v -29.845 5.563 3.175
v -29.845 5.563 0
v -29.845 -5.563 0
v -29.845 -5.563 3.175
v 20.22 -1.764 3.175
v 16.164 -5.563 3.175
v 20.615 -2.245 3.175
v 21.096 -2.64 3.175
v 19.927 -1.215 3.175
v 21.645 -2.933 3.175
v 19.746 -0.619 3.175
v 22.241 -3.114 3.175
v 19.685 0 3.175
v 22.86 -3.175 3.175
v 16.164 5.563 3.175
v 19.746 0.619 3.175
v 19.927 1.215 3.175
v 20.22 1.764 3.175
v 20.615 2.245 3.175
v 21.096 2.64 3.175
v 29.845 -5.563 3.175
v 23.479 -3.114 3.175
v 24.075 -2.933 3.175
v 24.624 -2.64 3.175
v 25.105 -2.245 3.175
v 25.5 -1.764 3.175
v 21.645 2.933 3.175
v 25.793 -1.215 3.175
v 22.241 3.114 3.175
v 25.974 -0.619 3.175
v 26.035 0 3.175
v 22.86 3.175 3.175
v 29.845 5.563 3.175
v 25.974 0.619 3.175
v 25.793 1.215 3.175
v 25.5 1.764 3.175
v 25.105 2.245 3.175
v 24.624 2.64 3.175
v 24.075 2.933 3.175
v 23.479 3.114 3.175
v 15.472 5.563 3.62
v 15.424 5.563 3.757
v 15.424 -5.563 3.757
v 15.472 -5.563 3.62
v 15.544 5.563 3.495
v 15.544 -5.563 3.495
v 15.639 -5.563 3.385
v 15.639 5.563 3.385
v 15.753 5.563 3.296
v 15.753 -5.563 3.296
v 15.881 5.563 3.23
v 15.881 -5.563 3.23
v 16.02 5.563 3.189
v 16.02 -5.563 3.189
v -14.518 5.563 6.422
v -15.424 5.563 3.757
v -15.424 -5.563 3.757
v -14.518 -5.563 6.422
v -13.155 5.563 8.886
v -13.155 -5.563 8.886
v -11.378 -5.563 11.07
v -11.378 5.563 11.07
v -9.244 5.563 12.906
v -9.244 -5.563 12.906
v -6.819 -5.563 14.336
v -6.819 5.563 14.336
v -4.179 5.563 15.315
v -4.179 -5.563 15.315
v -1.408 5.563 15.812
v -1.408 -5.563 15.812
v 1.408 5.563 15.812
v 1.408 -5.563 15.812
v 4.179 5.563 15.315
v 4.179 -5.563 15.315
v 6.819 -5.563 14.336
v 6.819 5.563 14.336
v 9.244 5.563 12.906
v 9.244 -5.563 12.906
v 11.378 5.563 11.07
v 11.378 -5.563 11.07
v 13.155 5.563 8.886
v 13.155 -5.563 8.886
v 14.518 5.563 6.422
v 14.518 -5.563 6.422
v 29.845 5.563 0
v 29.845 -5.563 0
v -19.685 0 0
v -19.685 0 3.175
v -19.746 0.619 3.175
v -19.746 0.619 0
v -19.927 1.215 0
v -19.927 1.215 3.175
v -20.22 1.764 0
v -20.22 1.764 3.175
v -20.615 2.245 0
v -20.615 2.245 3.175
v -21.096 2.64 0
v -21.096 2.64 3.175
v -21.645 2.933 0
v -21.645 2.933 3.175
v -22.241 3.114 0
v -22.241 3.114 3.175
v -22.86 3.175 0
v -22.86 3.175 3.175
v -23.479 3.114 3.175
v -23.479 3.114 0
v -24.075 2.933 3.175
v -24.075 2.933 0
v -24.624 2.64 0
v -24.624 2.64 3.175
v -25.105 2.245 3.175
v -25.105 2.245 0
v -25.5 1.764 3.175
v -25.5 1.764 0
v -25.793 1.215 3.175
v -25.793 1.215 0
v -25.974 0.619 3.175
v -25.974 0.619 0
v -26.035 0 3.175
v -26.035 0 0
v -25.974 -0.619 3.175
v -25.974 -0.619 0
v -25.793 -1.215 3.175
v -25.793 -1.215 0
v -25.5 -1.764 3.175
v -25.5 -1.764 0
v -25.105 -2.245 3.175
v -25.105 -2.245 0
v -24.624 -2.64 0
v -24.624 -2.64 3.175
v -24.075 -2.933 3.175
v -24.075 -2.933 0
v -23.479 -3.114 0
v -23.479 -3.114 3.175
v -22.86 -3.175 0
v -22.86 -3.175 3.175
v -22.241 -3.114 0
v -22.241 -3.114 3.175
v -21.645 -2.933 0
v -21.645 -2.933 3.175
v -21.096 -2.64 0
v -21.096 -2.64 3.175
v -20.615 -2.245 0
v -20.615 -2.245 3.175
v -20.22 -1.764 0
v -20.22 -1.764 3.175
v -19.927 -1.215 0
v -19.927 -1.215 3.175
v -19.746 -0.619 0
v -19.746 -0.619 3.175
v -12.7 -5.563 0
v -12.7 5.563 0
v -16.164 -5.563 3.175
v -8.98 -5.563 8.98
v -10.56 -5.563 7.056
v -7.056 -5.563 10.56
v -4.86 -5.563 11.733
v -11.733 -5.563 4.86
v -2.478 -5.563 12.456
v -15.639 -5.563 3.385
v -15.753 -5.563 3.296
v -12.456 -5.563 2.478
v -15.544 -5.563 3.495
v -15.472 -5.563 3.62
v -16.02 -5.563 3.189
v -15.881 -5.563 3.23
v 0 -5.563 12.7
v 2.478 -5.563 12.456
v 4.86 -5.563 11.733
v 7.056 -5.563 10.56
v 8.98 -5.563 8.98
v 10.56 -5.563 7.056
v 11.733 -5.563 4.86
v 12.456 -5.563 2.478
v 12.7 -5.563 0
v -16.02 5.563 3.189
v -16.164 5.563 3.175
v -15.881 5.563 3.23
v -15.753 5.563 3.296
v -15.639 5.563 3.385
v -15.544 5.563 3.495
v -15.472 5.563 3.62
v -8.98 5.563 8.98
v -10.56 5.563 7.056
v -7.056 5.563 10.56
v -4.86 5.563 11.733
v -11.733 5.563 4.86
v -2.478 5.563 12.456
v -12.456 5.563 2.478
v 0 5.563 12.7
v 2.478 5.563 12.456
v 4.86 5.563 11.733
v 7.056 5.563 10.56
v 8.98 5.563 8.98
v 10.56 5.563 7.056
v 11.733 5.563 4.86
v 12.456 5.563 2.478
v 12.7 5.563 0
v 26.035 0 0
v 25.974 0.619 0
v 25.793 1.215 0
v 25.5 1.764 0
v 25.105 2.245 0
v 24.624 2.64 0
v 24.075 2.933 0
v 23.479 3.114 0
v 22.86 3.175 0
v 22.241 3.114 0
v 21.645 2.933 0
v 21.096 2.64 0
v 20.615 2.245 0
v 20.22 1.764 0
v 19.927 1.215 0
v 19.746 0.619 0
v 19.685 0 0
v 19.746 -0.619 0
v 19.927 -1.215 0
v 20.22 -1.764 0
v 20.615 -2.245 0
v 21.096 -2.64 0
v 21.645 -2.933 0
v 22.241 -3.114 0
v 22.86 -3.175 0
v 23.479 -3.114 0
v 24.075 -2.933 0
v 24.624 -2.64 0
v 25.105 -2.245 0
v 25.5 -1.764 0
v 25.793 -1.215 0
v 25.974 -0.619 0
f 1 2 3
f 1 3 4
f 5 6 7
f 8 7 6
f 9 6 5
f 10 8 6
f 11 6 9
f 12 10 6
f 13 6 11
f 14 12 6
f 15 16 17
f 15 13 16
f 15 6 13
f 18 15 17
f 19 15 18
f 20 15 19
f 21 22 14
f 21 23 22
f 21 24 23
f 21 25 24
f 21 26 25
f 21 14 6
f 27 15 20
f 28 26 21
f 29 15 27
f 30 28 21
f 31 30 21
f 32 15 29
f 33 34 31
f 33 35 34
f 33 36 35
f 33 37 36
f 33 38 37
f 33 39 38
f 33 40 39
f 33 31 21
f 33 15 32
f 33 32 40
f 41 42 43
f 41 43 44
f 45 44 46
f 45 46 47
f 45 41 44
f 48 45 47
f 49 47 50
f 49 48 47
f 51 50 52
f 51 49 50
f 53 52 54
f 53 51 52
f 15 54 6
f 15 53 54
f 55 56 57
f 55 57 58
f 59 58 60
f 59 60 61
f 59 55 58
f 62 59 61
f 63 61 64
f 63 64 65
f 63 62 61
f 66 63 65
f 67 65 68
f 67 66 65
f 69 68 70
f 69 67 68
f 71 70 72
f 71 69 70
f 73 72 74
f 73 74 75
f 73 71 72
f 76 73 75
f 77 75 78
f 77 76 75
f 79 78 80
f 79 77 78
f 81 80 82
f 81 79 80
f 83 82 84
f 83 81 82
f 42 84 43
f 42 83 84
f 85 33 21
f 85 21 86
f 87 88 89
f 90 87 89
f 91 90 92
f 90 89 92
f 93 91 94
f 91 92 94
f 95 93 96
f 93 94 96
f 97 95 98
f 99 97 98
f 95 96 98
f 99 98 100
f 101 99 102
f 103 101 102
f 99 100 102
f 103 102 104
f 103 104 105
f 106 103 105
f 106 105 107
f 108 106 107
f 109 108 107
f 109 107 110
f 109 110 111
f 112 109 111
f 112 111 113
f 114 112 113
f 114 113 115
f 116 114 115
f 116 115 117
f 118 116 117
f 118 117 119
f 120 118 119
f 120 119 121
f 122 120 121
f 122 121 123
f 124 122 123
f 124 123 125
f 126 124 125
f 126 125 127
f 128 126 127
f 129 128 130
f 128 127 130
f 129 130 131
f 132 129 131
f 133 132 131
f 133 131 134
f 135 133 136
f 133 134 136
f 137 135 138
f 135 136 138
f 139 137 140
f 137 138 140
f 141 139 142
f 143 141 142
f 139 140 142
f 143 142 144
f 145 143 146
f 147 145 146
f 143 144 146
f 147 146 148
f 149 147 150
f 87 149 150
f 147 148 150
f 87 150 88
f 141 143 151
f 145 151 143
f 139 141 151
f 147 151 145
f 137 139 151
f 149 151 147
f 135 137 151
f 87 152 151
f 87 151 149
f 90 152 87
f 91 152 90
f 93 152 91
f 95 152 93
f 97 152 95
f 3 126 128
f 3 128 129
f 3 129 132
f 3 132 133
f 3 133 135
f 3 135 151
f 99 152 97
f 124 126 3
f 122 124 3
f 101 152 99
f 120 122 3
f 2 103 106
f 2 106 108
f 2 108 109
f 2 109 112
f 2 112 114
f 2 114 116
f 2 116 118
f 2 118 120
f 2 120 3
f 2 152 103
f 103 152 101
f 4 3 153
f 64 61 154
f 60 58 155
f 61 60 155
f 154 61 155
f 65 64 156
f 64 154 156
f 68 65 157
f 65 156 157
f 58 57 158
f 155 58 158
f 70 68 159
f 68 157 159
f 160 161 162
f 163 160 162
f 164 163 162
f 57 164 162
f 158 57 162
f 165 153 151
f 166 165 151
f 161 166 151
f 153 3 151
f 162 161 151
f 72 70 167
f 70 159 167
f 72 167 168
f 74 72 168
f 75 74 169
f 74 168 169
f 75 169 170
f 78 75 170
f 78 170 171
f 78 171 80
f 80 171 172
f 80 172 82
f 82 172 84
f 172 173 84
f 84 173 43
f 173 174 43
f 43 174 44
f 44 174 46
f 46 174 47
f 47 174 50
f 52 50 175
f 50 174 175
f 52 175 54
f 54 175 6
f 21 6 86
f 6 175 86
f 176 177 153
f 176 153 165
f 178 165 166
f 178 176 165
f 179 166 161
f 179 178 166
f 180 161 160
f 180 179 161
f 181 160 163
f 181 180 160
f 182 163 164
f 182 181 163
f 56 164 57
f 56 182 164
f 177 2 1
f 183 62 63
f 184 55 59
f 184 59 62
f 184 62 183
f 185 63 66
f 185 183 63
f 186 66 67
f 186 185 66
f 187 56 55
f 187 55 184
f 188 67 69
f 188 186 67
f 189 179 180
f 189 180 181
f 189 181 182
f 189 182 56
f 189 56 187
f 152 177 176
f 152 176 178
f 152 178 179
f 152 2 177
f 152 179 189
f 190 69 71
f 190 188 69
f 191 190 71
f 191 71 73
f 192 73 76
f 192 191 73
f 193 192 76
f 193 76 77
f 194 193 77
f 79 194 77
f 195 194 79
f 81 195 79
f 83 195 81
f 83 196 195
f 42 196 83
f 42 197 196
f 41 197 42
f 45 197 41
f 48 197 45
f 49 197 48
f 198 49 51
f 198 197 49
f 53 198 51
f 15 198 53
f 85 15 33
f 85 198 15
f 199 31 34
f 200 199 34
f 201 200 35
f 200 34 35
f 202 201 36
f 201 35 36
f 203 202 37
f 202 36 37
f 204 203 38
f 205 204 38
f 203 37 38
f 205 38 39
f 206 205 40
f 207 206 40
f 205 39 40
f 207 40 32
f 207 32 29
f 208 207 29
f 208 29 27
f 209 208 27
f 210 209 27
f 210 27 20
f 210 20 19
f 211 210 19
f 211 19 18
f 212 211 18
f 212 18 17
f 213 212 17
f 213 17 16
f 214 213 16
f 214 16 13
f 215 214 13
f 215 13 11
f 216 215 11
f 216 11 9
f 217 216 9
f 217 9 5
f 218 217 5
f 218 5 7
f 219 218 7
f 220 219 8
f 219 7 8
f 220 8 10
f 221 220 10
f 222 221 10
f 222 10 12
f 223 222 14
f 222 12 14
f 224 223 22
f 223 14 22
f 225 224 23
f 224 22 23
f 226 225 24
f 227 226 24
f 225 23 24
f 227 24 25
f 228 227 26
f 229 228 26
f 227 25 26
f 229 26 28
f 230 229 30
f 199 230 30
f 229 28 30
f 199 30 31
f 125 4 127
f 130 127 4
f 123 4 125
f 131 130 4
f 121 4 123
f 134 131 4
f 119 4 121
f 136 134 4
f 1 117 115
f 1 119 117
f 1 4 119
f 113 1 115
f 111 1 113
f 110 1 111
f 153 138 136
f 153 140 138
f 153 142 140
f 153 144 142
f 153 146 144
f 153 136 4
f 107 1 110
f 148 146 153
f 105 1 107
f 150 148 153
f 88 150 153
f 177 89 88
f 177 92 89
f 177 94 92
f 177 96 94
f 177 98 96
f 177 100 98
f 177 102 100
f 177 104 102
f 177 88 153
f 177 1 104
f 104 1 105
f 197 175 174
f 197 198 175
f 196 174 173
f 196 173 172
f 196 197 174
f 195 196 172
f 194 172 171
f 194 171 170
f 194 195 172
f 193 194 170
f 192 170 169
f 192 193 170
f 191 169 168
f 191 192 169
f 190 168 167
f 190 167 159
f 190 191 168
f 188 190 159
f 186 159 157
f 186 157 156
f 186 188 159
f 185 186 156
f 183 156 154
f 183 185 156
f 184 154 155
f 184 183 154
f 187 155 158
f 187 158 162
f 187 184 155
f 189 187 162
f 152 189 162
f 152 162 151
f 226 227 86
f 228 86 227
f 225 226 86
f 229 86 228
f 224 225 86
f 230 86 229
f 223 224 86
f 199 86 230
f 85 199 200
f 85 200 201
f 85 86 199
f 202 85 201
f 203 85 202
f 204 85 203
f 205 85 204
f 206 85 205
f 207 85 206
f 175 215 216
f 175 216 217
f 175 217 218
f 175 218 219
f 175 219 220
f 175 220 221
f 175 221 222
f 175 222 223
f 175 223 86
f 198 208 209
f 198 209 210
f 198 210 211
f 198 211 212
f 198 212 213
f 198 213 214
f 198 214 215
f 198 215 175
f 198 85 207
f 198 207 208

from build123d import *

# Parameters (mm, degrees)
BOSS_EXTRUDE1_DEPTH = 5.5626
SKETCH2_R           = 3.175
CUT_EXTRUDE1_DEPTH  = 4.175


with BuildPart() as part:
    # Sketch1 → Boss-Extrude1 (new body, symmetric)
    with BuildSketch(Plane(origin=(0, 0, 0), x_dir=(1, 0, 0), z_dir=(0, 1, 0))):
        with BuildLine():
            Line((-12.7, 0), (-29.845, 0))
            Line((-29.845, 0), (-29.845, -3.175))
            Line((-29.845, -3.175), (-16.164461018, -3.175))
            ThreePointArc((-16.164461018, -3.175), (-15.693695846, -3.337813758), (-15.424104025, -3.756679389))
            ThreePointArc((-15.424104025, -3.756679389), (0, -15.875), (15.424104025, -3.756679389))
            ThreePointArc((15.424104025, -3.756679389), (15.693695846, -3.337813758), (16.164461018, -3.175))
            Line((16.164461018, -3.175), (29.845, -3.175))
            Line((29.845, -3.175), (29.845, 0))
            Line((29.845, 0), (12.7, 0))
            ThreePointArc((12.7, 0), (0, -12.7), (-12.7, 0))
        make_face()
    extrude(amount=BOSS_EXTRUDE1_DEPTH, both=True)

    # Sketch2 → Cut-Extrude1 (cut, through all)
    with BuildSketch(Plane.XY.offset(3.175)):
        with Locations((-22.86, 0)):
            Circle(SKETCH2_R)
        with Locations((22.86, 0)):
            Circle(SKETCH2_R)
    extrude(amount=-CUT_EXTRUDE1_DEPTH, mode=Mode.SUBTRACT)


solid = part.part
